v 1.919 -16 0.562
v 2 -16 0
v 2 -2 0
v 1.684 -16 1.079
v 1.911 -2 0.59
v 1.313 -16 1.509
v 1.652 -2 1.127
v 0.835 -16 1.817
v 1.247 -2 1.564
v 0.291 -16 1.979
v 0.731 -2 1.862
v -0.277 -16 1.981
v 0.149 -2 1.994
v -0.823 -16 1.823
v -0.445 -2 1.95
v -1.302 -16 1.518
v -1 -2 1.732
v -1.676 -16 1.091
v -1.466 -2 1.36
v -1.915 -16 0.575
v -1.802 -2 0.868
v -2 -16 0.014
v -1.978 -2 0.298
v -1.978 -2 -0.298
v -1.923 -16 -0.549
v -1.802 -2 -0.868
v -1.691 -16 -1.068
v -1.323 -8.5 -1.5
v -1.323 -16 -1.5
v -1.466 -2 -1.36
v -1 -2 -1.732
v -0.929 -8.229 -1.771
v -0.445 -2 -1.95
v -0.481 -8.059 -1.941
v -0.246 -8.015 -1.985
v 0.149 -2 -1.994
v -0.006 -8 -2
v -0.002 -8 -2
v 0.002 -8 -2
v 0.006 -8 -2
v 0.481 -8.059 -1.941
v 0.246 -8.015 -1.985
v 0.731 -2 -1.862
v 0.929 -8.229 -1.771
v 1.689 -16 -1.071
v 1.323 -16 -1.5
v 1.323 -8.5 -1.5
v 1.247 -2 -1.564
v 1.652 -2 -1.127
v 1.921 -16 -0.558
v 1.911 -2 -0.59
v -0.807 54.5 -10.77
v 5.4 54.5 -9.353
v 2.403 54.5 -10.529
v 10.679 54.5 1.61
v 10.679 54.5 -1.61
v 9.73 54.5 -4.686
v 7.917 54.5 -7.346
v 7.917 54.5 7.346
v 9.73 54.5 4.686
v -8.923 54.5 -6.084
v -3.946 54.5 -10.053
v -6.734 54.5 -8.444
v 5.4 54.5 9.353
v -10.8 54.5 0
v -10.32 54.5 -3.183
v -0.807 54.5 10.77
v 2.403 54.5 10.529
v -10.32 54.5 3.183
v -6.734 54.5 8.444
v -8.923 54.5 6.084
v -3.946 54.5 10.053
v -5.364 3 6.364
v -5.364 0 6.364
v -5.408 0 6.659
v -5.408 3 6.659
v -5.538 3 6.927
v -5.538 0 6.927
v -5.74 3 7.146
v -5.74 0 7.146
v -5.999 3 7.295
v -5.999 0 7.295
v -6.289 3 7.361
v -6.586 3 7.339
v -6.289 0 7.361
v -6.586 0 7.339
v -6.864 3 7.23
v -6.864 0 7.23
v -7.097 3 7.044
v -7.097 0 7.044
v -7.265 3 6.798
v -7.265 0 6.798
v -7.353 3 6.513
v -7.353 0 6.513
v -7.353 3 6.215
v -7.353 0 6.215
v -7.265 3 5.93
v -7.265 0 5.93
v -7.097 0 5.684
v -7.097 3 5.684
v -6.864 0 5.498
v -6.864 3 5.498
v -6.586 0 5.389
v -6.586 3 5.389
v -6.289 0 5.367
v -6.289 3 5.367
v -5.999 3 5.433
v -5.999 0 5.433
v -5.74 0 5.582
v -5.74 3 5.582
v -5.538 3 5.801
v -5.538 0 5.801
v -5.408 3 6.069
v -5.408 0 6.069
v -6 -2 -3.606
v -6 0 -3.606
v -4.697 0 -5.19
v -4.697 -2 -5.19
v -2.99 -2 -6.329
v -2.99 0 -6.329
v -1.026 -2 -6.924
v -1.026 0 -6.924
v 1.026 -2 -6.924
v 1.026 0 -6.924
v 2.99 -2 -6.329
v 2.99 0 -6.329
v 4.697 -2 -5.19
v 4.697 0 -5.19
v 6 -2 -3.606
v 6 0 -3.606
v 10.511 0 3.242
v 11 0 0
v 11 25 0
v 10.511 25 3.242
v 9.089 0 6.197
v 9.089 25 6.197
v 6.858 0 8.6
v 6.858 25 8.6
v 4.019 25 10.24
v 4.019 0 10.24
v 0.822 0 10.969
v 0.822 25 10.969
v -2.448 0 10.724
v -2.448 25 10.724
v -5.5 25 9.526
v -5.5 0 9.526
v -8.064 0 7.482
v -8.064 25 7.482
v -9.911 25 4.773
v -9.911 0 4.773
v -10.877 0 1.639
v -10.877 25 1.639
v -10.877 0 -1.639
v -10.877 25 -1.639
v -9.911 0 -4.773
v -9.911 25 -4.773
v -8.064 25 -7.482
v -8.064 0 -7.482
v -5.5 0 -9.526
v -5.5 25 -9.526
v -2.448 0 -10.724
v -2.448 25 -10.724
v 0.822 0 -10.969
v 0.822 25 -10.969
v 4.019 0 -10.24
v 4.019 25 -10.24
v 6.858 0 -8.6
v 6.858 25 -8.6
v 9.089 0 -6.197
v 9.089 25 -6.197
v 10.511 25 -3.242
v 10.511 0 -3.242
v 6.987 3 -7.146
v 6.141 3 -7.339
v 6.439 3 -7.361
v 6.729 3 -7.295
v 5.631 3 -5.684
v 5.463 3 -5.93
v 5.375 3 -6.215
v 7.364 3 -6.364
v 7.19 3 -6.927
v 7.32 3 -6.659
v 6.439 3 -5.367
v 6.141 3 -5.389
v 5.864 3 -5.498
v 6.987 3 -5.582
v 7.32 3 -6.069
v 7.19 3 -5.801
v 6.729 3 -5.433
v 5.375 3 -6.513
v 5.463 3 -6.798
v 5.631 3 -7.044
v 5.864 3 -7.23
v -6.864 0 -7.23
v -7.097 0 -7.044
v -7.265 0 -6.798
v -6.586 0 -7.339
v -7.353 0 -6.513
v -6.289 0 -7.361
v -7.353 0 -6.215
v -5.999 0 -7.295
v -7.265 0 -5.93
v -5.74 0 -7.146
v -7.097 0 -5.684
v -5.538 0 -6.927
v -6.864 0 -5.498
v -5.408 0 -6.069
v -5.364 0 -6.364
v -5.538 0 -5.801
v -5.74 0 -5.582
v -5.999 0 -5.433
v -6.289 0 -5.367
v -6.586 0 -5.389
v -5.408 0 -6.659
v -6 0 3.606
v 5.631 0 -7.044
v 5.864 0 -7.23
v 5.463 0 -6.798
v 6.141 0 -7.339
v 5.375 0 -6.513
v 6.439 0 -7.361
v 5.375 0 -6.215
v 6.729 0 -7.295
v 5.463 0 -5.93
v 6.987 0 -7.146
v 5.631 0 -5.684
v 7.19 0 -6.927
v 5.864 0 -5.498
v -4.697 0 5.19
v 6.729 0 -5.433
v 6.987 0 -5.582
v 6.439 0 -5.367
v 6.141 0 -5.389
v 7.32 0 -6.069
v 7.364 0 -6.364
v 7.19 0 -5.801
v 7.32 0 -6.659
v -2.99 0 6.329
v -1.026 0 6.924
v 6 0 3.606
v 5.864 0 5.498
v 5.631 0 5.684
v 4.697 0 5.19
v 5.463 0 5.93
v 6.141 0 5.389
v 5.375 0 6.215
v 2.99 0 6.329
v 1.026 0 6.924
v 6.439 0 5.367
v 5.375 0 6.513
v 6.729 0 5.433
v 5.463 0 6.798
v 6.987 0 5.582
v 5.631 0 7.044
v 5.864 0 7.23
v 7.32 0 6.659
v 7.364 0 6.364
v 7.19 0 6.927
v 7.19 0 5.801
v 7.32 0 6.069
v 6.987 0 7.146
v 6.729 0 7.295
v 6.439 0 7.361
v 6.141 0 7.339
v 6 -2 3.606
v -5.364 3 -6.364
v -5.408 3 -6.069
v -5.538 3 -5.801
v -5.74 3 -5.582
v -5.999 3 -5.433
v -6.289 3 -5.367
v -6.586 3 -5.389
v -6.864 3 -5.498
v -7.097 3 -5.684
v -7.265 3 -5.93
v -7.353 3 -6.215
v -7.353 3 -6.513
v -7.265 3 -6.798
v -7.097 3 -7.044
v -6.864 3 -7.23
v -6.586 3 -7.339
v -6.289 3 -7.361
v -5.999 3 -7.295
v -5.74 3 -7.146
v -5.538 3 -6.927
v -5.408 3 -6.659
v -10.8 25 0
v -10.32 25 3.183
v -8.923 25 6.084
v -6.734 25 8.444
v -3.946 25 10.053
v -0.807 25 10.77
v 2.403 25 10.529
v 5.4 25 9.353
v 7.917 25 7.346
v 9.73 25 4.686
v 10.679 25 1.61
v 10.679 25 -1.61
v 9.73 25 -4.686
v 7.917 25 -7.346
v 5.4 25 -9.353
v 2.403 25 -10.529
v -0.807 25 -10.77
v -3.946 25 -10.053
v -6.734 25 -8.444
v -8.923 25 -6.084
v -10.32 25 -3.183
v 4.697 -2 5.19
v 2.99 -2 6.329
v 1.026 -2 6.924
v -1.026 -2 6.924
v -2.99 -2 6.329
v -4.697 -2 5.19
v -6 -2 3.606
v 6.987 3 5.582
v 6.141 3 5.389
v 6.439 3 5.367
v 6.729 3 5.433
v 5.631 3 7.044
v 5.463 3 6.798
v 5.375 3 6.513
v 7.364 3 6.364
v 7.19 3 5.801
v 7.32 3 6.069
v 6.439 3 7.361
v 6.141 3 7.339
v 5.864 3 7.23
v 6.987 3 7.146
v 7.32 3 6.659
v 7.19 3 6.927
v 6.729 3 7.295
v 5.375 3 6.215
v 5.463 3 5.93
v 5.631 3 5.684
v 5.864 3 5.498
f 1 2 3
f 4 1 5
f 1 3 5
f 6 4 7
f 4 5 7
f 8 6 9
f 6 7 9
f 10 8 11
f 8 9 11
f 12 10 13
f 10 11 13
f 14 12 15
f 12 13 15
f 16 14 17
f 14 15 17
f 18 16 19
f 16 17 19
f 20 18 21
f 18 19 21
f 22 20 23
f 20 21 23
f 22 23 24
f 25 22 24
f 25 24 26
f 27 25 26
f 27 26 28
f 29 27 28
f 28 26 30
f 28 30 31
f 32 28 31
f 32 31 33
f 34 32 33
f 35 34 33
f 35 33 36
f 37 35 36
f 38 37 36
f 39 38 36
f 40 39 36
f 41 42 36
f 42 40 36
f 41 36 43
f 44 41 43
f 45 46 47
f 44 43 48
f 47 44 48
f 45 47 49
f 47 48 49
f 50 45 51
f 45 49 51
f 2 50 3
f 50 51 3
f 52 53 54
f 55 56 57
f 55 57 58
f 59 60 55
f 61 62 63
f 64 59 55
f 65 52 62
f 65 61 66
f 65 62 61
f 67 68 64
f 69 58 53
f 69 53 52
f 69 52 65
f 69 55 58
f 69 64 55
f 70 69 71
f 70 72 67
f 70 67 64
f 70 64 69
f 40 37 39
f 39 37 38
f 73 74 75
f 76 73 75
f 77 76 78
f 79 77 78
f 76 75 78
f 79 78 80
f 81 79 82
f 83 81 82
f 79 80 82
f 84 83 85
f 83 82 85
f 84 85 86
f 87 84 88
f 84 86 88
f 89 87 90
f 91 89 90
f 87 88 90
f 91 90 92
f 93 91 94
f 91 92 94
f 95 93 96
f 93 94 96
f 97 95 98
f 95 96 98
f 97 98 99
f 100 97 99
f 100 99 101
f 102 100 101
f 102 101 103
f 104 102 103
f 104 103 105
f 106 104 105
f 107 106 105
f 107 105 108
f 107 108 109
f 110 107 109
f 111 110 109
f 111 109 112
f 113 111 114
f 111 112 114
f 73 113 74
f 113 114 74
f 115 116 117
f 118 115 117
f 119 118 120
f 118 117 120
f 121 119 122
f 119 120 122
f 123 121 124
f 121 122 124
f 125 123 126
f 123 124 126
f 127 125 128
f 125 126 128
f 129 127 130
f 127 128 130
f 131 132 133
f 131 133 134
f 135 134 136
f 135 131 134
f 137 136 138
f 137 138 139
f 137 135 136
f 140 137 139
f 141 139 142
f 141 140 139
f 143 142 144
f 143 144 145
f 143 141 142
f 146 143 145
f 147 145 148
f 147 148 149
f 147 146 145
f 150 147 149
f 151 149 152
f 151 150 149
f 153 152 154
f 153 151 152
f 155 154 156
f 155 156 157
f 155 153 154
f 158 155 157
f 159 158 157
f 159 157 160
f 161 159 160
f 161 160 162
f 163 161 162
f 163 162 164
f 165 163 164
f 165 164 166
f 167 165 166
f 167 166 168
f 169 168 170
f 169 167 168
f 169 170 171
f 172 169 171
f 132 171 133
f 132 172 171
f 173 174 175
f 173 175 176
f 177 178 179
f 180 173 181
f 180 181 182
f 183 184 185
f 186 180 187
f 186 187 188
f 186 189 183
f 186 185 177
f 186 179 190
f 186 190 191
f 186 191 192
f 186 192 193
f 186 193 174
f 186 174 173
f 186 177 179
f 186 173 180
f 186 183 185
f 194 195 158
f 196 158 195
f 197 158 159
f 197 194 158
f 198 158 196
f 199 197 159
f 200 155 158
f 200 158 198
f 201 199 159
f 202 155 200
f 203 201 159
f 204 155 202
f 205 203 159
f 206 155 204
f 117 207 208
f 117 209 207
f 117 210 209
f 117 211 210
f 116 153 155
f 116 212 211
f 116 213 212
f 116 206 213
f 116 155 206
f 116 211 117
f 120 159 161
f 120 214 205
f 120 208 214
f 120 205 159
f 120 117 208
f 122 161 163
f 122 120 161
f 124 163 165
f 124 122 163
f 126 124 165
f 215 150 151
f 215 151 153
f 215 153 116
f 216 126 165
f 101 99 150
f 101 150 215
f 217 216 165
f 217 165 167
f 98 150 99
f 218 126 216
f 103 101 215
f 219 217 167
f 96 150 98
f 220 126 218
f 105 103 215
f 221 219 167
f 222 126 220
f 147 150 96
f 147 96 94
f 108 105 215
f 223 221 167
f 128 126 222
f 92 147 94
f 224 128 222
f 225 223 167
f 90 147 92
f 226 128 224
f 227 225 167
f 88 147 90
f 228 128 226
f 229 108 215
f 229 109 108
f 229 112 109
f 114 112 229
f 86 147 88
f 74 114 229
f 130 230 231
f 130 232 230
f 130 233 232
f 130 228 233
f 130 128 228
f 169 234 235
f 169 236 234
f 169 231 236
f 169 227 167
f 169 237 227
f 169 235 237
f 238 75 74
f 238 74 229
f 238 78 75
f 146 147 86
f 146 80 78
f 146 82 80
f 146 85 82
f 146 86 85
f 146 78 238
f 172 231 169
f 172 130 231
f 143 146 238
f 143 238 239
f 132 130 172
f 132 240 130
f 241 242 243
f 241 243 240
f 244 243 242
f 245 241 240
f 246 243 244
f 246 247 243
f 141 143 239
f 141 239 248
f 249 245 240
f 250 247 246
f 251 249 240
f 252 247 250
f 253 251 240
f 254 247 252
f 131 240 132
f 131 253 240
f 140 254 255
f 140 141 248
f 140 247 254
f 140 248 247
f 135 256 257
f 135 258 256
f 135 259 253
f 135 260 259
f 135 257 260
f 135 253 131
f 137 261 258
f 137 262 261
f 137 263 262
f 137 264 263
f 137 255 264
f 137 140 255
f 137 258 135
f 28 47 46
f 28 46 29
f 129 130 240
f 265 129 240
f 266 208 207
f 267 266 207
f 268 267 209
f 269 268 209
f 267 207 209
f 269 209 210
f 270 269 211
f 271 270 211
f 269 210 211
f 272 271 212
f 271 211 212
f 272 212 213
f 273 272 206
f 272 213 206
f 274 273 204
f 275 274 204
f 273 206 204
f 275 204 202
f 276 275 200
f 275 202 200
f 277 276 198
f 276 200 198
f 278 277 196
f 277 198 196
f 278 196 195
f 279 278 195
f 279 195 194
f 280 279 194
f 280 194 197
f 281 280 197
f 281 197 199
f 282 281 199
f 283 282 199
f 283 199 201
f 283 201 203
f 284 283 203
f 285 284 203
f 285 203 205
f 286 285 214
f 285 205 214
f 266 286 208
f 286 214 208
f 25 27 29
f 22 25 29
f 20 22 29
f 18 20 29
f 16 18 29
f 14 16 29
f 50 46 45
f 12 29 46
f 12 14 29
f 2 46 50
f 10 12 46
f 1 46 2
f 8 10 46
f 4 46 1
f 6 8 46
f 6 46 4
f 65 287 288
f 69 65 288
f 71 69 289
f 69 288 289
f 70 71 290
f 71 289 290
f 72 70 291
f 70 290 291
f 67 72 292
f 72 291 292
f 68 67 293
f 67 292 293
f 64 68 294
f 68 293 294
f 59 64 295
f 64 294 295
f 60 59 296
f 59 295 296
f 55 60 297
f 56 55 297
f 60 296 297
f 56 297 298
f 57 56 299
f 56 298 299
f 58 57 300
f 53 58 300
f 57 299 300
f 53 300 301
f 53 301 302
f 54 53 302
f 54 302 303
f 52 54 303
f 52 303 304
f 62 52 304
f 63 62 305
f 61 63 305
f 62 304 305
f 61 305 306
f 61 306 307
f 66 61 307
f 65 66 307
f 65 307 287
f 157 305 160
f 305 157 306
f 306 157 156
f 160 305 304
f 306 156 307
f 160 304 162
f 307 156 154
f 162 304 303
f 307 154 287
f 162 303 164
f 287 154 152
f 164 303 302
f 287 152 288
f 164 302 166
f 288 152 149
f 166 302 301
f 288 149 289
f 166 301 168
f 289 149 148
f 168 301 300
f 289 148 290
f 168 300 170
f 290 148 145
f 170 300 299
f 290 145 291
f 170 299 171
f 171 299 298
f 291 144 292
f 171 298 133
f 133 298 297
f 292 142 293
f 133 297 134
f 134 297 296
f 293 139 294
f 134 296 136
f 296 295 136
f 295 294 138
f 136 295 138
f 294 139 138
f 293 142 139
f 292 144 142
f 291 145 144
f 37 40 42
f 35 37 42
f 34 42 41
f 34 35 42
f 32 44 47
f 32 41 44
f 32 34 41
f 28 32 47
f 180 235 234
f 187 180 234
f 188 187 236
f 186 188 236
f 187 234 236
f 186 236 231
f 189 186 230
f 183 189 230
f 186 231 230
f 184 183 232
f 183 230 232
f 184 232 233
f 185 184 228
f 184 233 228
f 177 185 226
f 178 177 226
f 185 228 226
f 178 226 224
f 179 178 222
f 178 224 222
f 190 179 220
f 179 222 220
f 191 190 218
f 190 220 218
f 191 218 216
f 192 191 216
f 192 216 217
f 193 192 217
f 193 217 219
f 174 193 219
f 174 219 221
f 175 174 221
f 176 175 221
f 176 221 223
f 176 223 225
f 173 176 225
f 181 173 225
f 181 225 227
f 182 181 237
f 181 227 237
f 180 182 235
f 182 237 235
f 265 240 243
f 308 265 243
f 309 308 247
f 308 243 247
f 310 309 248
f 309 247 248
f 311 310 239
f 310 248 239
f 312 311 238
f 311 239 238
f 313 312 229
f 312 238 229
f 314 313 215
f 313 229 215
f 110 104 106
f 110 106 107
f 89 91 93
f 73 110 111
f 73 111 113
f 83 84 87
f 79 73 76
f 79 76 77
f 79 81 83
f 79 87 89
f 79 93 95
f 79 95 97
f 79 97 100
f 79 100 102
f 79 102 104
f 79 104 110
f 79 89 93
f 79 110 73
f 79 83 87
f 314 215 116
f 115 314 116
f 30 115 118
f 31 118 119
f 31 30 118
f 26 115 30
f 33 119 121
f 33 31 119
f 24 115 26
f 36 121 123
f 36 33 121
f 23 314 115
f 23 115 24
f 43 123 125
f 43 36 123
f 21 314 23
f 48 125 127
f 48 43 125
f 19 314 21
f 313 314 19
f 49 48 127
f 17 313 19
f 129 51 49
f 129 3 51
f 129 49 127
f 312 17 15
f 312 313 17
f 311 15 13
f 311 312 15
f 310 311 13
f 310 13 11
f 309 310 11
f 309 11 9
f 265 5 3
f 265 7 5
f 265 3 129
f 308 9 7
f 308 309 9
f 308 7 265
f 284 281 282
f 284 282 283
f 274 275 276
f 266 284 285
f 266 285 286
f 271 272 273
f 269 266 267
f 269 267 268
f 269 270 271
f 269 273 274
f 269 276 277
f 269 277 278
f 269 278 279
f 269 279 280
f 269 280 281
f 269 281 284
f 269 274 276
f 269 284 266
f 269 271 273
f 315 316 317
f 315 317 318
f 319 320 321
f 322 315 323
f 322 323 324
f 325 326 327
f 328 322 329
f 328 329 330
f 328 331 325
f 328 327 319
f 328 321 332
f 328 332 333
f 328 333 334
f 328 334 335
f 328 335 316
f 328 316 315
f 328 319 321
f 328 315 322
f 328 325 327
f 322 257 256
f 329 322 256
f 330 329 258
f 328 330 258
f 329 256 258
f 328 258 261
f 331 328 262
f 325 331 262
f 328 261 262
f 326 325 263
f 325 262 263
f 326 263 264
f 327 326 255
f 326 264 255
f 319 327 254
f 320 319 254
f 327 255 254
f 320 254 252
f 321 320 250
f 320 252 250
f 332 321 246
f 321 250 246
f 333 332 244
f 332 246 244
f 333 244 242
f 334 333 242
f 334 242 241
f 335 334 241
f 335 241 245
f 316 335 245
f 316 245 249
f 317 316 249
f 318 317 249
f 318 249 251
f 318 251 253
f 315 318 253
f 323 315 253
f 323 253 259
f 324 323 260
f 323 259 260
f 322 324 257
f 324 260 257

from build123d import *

# Parameters (mm, degrees)
F0_R      = 11
F1_DEPTH  = 25
F2_R      = 10.8
F3_DEPTH  = 29.5
F5_DEPTH  = 2
F6_R      = 2
F7_DEPTH  = 14
F9_DEPTH  = 8
F10_SIZE  = 0.49999
F11_R     = 1
F12_DEPTH = 3


# Not quite as in the source:
# - a fillet or chamfer is up to 0.001 mm smaller than in the source, because OpenCascade refuses the exact size


with BuildPart() as f1:
    # F0 (on Front) → F1 (new body)
    with BuildSketch(Plane.XZ):
        Circle(F0_R)
    extrude(amount=-F1_DEPTH)

    # F2 (on face) → F3 (join)
    with BuildSketch(Plane(origin=(0, 25, 0), x_dir=(-1, 0, 0), z_dir=(0, 1, 0))):
        Circle(F2_R)
    extrude(amount=F3_DEPTH)

    # F4 (on face) → F5 (join)
    with BuildSketch(Plane.XZ):
        with BuildLine():
            Line((6, -3.6055512755), (6, 3.6055512755))
            ThreePointArc((6, 3.6055512755), (0, 7), (-6, 3.6055512755))
            Line((-6, 3.6055512755), (-6, -3.6055512755))
            ThreePointArc((-6, -3.6055512755), (0, -7), (6, -3.6055512755))
        make_face()
    extrude(amount=F5_DEPTH)

    # F6 (on face) → F7 (join)
    with BuildSketch(Plane.XZ.offset(2)):
        Circle(F6_R)
    extrude(amount=F7_DEPTH)

    # F8 (on face) → F9 (cut)
    with BuildSketch(Plane.XZ.offset(16)):
        with BuildLine():
            ThreePointArc((-1.3228756555, -1.5), (0, -2), (1.3228756555, -1.5))
            Line((1.3228756555, -1.5), (-1.3228756555, -1.5))
        make_face()
    extrude(amount=-F9_DEPTH, mode=Mode.SUBTRACT)

    # F10 (size 0.5 in the source; OpenCascade refuses exactly that, so slightly less here)
    f10_edges = [f1.edges().sort_by_distance(p)[0] for p in [
        (0, -8, -1.5),
    ]]
    chamfer(f10_edges, length=F10_SIZE)

    # F11 (on face) → F12 (cut)
    with BuildSketch(Plane.XZ):
        with Locations((6.3639610307, -6.3639610307)):
            Circle(F11_R)
        with Locations((-6.3639610307, -6.3639610307)):
            Circle(F11_R)
        with Locations((-6.3639610307, 6.3639610307)):
            Circle(F11_R)
        with Locations((6.3639610307, 6.3639610307)):
            Circle(F11_R)
    extrude(amount=-F12_DEPTH, mode=Mode.SUBTRACT)


solid = f1.part
